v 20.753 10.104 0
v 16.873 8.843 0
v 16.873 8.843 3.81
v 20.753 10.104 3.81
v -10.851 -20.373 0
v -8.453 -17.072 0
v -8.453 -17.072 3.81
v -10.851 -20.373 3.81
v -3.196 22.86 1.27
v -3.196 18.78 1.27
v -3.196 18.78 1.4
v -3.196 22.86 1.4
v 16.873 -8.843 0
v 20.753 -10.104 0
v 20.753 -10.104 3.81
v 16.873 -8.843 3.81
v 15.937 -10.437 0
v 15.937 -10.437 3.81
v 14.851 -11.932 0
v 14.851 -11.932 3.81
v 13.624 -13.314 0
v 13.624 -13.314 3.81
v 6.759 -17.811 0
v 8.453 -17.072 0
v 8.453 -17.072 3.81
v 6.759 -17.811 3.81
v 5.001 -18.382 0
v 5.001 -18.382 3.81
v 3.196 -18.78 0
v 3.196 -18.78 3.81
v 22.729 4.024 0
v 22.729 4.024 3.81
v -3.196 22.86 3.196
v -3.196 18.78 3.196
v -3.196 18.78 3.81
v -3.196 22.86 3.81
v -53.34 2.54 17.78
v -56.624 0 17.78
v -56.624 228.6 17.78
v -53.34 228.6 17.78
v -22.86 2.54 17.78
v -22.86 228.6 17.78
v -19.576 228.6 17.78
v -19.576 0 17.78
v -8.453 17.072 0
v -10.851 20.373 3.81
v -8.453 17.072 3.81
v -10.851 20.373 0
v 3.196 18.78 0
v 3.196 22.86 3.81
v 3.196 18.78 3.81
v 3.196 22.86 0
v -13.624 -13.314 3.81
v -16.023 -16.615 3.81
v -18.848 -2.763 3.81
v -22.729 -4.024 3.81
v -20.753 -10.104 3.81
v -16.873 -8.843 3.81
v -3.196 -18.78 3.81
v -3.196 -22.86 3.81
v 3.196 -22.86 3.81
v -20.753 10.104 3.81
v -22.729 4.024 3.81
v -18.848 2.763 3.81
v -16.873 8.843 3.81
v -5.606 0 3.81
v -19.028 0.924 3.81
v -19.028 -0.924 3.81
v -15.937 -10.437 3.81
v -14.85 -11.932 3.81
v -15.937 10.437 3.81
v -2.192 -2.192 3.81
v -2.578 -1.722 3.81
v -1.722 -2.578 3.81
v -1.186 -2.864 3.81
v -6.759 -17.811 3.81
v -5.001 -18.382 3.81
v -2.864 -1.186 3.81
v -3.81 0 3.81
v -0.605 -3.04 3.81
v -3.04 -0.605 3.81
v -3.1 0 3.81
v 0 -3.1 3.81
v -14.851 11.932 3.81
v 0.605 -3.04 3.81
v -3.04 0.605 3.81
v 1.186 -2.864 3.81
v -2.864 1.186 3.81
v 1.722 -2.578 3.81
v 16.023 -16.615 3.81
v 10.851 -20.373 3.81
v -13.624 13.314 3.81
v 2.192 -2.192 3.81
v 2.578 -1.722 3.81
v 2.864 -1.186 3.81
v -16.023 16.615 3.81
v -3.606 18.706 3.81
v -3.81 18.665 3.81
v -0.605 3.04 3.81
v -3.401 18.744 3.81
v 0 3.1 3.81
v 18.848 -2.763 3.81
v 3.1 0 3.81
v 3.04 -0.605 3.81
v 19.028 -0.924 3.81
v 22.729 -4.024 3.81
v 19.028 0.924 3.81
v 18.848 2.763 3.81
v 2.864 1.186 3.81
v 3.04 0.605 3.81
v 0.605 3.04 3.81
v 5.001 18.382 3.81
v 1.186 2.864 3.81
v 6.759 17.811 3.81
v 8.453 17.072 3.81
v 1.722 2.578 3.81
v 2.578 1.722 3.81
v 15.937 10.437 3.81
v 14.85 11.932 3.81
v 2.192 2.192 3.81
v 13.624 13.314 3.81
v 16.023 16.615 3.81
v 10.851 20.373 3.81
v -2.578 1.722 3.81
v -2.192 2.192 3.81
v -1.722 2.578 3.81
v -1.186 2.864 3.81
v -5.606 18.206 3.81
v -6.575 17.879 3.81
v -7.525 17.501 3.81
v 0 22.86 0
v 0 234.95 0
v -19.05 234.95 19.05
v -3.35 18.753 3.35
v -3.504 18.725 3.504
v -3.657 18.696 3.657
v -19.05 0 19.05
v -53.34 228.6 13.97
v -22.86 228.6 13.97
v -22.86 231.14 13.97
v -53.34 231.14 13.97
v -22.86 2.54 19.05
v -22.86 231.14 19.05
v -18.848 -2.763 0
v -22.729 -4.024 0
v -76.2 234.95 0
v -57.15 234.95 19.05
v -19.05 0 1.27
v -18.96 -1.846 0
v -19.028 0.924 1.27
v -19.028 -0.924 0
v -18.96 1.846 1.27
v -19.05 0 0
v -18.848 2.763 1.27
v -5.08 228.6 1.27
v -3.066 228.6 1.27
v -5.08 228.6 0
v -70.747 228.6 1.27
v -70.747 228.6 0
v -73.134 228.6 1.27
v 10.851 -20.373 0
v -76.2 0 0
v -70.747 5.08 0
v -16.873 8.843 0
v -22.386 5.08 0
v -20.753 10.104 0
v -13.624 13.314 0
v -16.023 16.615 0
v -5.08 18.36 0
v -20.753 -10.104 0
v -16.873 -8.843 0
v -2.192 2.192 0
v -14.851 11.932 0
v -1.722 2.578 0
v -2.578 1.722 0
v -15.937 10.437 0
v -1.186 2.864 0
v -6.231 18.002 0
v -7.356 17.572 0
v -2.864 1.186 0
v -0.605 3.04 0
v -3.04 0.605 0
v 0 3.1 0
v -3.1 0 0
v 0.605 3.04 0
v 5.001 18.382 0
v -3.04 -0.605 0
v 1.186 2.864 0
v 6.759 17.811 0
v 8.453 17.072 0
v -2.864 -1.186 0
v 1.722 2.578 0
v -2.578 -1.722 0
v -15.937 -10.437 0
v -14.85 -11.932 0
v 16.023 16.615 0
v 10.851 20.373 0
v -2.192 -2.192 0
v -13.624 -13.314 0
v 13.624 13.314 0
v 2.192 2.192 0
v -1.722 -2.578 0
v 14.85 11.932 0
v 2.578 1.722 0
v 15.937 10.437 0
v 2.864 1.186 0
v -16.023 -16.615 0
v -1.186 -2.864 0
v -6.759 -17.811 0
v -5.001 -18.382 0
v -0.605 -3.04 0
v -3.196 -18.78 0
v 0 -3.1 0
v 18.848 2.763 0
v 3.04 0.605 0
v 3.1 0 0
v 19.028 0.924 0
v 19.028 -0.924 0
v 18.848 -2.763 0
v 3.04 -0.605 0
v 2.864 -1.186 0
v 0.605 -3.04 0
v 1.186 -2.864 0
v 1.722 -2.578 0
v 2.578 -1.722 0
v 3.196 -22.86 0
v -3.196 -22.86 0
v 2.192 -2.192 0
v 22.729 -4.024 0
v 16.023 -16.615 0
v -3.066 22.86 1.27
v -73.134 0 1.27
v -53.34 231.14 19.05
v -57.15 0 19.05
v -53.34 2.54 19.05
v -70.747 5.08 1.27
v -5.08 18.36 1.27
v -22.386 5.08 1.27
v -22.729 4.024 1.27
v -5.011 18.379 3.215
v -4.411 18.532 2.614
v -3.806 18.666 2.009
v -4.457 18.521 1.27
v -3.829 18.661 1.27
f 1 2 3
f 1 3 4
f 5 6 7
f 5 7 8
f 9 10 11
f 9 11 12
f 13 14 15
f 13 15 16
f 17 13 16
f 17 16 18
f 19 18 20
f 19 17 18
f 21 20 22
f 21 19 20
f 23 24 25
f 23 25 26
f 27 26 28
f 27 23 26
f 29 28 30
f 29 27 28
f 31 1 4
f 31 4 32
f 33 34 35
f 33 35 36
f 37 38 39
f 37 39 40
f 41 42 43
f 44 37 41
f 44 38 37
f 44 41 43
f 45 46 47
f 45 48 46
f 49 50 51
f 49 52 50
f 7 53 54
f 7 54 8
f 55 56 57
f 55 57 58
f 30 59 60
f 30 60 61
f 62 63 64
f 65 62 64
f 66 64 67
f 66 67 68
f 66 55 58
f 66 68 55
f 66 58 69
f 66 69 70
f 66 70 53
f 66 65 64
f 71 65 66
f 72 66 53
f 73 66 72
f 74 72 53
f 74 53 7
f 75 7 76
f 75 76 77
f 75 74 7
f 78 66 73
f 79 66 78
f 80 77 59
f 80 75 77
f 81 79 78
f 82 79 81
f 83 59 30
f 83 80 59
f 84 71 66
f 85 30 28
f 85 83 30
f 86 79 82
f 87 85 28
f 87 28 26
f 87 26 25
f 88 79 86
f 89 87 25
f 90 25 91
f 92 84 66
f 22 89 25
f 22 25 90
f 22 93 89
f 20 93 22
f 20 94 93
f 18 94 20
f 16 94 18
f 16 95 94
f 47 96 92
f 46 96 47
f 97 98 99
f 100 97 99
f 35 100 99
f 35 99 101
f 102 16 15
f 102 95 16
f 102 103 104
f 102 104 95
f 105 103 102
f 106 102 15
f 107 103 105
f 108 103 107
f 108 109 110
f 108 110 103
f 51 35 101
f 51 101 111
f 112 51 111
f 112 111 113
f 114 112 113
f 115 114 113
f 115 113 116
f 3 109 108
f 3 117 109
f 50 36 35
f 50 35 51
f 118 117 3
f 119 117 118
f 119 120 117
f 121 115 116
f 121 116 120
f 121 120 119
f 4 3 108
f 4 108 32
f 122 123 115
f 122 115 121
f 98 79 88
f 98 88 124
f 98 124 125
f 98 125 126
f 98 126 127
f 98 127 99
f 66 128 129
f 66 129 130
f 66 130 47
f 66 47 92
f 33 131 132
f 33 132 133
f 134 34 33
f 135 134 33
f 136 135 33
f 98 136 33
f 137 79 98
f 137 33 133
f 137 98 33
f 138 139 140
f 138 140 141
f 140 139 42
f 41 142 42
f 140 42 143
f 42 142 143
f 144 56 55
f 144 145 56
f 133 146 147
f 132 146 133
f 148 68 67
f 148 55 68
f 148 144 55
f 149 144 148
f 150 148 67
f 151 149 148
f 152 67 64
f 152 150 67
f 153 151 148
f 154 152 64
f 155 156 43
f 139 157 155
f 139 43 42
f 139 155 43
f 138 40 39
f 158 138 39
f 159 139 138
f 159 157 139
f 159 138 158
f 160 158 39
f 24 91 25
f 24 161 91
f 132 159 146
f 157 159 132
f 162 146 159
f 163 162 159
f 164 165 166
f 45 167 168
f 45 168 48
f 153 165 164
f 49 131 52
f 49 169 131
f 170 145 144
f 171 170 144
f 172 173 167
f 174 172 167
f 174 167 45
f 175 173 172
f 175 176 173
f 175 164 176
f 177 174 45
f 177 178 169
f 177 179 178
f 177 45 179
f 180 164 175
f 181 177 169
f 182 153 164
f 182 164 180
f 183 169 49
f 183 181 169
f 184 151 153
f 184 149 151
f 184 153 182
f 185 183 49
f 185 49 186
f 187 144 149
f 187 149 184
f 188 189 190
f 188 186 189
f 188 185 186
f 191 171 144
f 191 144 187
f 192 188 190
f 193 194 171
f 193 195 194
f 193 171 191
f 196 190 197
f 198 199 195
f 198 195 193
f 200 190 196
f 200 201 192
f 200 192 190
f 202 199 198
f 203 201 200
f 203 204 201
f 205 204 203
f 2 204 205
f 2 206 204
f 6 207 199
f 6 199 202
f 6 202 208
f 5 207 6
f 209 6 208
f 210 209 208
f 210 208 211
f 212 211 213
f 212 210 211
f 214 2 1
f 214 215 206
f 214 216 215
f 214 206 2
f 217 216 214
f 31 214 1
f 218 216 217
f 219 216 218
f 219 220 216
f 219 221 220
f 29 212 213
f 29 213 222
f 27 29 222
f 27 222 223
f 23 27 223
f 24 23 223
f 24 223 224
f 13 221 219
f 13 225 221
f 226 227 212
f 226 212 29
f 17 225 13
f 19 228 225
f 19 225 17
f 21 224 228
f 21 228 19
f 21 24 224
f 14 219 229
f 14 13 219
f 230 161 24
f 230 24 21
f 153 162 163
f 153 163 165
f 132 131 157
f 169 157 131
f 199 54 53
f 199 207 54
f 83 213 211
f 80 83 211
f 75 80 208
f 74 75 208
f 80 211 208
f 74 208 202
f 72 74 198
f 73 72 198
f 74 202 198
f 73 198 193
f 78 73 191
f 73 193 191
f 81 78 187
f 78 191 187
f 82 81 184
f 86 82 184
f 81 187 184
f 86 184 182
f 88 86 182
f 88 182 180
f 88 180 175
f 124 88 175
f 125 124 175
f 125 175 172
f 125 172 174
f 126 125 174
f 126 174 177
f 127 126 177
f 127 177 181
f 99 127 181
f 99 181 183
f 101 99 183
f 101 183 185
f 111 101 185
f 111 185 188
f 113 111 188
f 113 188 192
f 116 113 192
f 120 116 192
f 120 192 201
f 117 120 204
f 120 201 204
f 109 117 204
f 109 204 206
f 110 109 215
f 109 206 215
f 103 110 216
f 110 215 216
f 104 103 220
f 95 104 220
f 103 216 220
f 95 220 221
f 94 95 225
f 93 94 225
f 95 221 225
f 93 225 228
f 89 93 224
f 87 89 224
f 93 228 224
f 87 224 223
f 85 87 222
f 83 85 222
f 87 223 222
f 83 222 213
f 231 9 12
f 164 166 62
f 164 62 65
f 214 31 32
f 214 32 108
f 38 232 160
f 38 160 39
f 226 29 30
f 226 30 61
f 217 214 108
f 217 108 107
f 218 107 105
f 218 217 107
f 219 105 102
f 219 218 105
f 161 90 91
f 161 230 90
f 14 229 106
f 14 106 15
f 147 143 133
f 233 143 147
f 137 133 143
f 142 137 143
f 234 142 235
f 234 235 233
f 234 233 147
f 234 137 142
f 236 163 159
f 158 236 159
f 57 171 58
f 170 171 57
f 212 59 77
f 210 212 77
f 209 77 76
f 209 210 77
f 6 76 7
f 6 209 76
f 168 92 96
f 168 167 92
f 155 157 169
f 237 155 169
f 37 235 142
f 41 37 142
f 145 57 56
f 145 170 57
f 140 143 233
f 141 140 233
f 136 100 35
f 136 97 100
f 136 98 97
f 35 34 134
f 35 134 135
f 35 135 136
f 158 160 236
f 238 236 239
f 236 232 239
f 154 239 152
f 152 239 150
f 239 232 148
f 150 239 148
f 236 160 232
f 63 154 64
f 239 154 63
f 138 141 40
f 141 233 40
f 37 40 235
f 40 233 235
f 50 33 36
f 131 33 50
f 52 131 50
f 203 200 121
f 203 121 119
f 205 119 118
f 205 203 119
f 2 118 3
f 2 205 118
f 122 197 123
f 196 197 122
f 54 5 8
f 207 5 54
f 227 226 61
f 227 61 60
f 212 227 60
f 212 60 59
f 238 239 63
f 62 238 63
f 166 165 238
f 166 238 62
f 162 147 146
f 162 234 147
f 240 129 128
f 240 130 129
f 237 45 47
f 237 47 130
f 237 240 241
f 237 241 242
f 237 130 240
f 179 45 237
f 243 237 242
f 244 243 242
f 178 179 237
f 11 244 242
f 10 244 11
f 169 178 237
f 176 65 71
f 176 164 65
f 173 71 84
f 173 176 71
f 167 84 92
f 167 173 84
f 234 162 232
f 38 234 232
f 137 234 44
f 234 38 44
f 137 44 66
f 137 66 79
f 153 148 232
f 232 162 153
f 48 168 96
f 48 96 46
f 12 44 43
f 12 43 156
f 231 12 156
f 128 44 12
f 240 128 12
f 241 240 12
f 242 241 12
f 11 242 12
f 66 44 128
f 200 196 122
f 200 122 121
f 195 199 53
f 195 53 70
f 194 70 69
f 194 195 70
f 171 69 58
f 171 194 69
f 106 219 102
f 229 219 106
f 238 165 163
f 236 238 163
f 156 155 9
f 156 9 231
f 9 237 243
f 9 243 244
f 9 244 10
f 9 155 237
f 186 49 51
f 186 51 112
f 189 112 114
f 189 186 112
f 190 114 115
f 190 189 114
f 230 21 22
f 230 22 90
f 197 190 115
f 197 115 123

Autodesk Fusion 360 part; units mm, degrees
sketch "top hopper side" plane through (0, 0, 0) normal (0, 1, 0) x (1, 0, 0)
  line L0 (-76.2, 0) -> (0, 0)
  line L1 (0, 0) -> (-19.05, -19.05)
  line L2 (-19.05, -19.05) -> (-57.15, -19.05)
  line L3 (-57.15, -19.05) -> (-76.2, 0)
  dimension "d12" = 76.2
  dimension "d13" = 38.1
  dimension "d14" = 45
extrude "Extrude3" add sketch "top hopper side" along normal blind 234.95
sketch "side cutout" plane through (0, 0, 0) normal (0, -1, 0) x (1, 0, 0)
  line L0 (-19.05, 19.05) -> (-57.15, 19.05)
  line L1 (-57.15, 19.05) -> (-76.2, 0)
  line L2 (-76.2, 0) -> (0, 0)
  line L3 (0, 0) -> (-19.05, 19.05)
  line L4 (-76.2, 0) -> (-57.15, 19.05)
  line L5 (-19.05, 19.05) -> (0, 0)
  line L6 (-76.2, 0) -> (0, 0)
  line L7 (-57.15, 19.05) -> (-19.05, 19.05)
  line L8 (-73.1339, 1.27) -> (-3.0661, 1.27)
  line L9 (-19.5761, 17.78) -> (-3.0661, 1.27)
  line L10 (-56.6239, 17.78) -> (-19.5761, 17.78)
  line L11 (-73.1339, 1.27) -> (-56.6239, 17.78)
  dimension "d17" = 1.27
extrude "Extrude4" cut sketch "side cutout" against normal blind 228.6 contours L8 L9 L10 L11
sketch "bottom cutout" plane through (0, 0, 0) normal (0, 0, -1) x (1, 0, 0)
  line L0 (0, 0) -> (-76.2, 0)
  line L1 (-76.2, 0) -> (-76.2, -234.95)
  line L2 (-76.2, -234.95) -> (0, -234.95)
  line L3 (0, -234.95) -> (0, 0)
  line L4 (-5.08, -5.08) -> (-70.7474, -5.08)
  line L5 (-70.7474, -5.08) -> (-70.7474, -228.6)
  line L6 (-5.08, -228.6) -> (-5.08, -5.08)
  line L7 (-5.08, -228.6) -> (-70.7474, -228.6)
  dimension "d20" = 223.52
  dimension "d21" = 65.6674
  dimension "d22" = 5.08
  dimension "d23" = 5.08
extrude "Extrude5" cut sketch "bottom cutout" against normal blind 2.54 contours L4 L5 L6 L7
sketch "top cutout" plane through (0, 0, 19.05) normal (0, 0, 1) x (-1, 0, 0)
  line L0 (57.15, 0) -> (19.05, 0)
  line L1 (19.05, 0) -> (19.05, -234.95)
  line L2 (19.05, -234.95) -> (57.15, -234.95)
  line L3 (57.15, -234.95) -> (57.15, 0)
  line L4 (53.34, -2.54) -> (22.86, -2.54)
  line L5 (22.86, -2.54) -> (22.86, -231.14)
  line L6 (22.86, -231.14) -> (53.34, -231.14)
  line L7 (53.34, -231.14) -> (53.34, -2.54)
  dimension "d26" = 228.6
  dimension "d27" = 30.48
  dimension "d28" = 3.81
  dimension "d29" = 2.54
extrude "Extrude6" cut sketch "top cutout" against normal blind 5.08 contours L4 L5 L6 L7

Autodesk Fusion 360 part; units mm, degrees
sketch "wheel" plane through (0, 0, 0) normal (0, 0, 1) x (1, 0, 0)
  circle A0 centre (0, 0) radius 19.05
  line L0 (-3.1964, 18.7799) -> (-3.1964, 22.86)
  line L1 (-3.1964, 22.86) -> (3.1964, 22.86)
  line L2 (3.1964, 22.86) -> (3.1964, 18.7799)
  line L3 (-13.6245, 13.3144) -> (-16.0227, 16.6153)
  line L4 (-16.0227, 16.6153) -> (-10.8508, 20.3729)
  line L5 (-10.8508, 20.3729) -> (-8.4526, 17.0721)
  line L6 (-18.8485, 2.7633) -> (-22.7289, 4.0241)
  line L7 (-22.7289, 4.0241) -> (-20.7534, 10.1041)
  line L8 (-20.7534, 10.1041) -> (-16.873, 8.8433)
  line L9 (-16.873, -8.8433) -> (-20.7534, -10.1041)
  line L10 (-20.7534, -10.1041) -> (-22.7289, -4.0241)
  line L11 (-22.7289, -4.0241) -> (-18.8485, -2.7633)
  line L12 (-8.4526, -17.0721) -> (-10.8508, -20.373)
  line L13 (-10.8508, -20.373) -> (-16.0227, -16.6153)
  line L14 (-16.0227, -16.6153) -> (-13.6245, -13.3145)
  line L15 (3.1964, -18.7799) -> (3.1964, -22.86)
  line L16 (3.1964, -22.86) -> (-3.1964, -22.86)
  line L17 (-3.1964, -22.86) -> (-3.1964, -18.7799)
  line L18 (13.6245, -13.3144) -> (16.0227, -16.6153)
  line L19 (16.0227, -16.6153) -> (10.8508, -20.3729)
  line L20 (10.8508, -20.3729) -> (8.4526, -17.0721)
  line L21 (18.8485, -2.7633) -> (22.7289, -4.0241)
  line L22 (22.7289, -4.0241) -> (20.7534, -10.1041)
  line L23 (20.7534, -10.1041) -> (16.873, -8.8433)
  line L24 (16.873, 8.8433) -> (20.7534, 10.1041)
  line L25 (20.7534, 10.1041) -> (22.7289, 4.0241)
  line L26 (22.7289, 4.0241) -> (18.8485, 2.7633)
  line L27 (8.4526, 17.0721) -> (10.8508, 20.373)
  line L28 (10.8508, 20.373) -> (16.0227, 16.6153)
  line L29 (16.0227, 16.6153) -> (13.6245, 13.3145)
  dimension "d1" = 38.1
  dimension "d2" = 6.3929
  dimension "d3" = 4.0801
  dimension "d5" = 360
extrude "Extrude1" add sketch "wheel" along normal blind 3.81
sketch "hole punch" plane through (0, 0, 3.81) normal (0, 0, 1) x (-1, 0, 0)
  arc A0 (-8.4526, -17.0721) -> (-3.1964, -18.7799) centre (0, 0) ccw
  line L0 (-3.1964, -18.7799) -> (-3.1964, -22.86)
  line L1 (-3.1964, -22.86) -> (3.1964, -22.86)
  line L2 (3.1964, -22.86) -> (3.1964, -18.7799)
  arc A1 (3.1964, -18.7799) -> (8.4526, -17.0721) centre (0, 0) ccw
  line L3 (8.4526, -17.0721) -> (10.8508, -20.3729)
  line L4 (10.8508, -20.3729) -> (16.0227, -16.6153)
  line L5 (16.0227, -16.6153) -> (13.6245, -13.3144)
  arc A2 (13.6245, -13.3144) -> (16.873, -8.8433) centre (0, 0) ccw
  line L6 (16.873, -8.8433) -> (20.7534, -10.1041)
  line L7 (20.7534, -10.1041) -> (22.7289, -4.0241)
  line L8 (22.7289, -4.0241) -> (18.8485, -2.7633)
  arc A3 (18.8485, -2.7633) -> (18.8485, 2.7633) centre (0, 0) ccw
  line L9 (18.8485, 2.7633) -> (22.7289, 4.0241)
  line L10 (22.7289, 4.0241) -> (20.7534, 10.1041)
  line L11 (20.7534, 10.1041) -> (16.873, 8.8433)
  arc A4 (16.873, 8.8433) -> (13.6245, 13.3145) centre (0, 0) ccw
  line L12 (13.6245, 13.3145) -> (16.0227, 16.6153)
  line L13 (16.0227, 16.6153) -> (10.8508, 20.373)
  line L14 (10.8508, 20.373) -> (8.4526, 17.0721)
  arc A5 (8.4526, 17.0721) -> (3.1964, 18.7799) centre (0, 0) ccw
  line L15 (3.1964, 18.7799) -> (3.1964, 22.86)
  line L16 (3.1964, 22.86) -> (-3.1964, 22.86)
  line L17 (-3.1964, 22.86) -> (-3.1964, 18.7799)
  arc A6 (-3.1964, 18.7799) -> (-8.4526, 17.0721) centre (0, 0) ccw
  line L18 (-8.4526, 17.0721) -> (-10.8508, 20.3729)
  line L19 (-10.8508, 20.3729) -> (-16.0227, 16.6153)
  line L20 (-16.0227, 16.6153) -> (-13.6245, 13.3144)
  arc A7 (-13.6245, 13.3144) -> (-16.873, 8.8433) centre (0, 0) ccw
  line L21 (-16.873, 8.8433) -> (-20.7534, 10.1041)
  line L22 (-20.7534, 10.1041) -> (-22.7289, 4.0241)
  line L23 (-22.7289, 4.0241) -> (-18.8485, 2.7633)
  arc A8 (-18.8485, 2.7633) -> (-18.8485, -2.7633) centre (0, 0) ccw
  line L24 (-18.8485, -2.7633) -> (-22.7289, -4.0241)
  line L25 (-22.7289, -4.0241) -> (-20.7534, -10.1041)
  line L26 (-20.7534, -10.1041) -> (-16.873, -8.8433)
  arc A9 (-16.873, -8.8433) -> (-13.6245, -13.3145) centre (0, 0) ccw
  line L27 (-13.6245, -13.3145) -> (-16.0227, -16.6153)
  line L28 (-16.0227, -16.6153) -> (-10.8508, -20.373)
  line L29 (-10.8508, -20.373) -> (-8.4526, -17.0721)
  circle A10 centre (0, 0) radius 19.05
  line L30 (0.0528, -19.0499) -> (0.0528, 19.0499)
  line L31 (19.05, 0) -> (-19.05, 0)
hole "Hole1" at (0, 0, 3.81) direction (0, 0, -1) diameter 6.2 depth 6.2 tip angle 118
